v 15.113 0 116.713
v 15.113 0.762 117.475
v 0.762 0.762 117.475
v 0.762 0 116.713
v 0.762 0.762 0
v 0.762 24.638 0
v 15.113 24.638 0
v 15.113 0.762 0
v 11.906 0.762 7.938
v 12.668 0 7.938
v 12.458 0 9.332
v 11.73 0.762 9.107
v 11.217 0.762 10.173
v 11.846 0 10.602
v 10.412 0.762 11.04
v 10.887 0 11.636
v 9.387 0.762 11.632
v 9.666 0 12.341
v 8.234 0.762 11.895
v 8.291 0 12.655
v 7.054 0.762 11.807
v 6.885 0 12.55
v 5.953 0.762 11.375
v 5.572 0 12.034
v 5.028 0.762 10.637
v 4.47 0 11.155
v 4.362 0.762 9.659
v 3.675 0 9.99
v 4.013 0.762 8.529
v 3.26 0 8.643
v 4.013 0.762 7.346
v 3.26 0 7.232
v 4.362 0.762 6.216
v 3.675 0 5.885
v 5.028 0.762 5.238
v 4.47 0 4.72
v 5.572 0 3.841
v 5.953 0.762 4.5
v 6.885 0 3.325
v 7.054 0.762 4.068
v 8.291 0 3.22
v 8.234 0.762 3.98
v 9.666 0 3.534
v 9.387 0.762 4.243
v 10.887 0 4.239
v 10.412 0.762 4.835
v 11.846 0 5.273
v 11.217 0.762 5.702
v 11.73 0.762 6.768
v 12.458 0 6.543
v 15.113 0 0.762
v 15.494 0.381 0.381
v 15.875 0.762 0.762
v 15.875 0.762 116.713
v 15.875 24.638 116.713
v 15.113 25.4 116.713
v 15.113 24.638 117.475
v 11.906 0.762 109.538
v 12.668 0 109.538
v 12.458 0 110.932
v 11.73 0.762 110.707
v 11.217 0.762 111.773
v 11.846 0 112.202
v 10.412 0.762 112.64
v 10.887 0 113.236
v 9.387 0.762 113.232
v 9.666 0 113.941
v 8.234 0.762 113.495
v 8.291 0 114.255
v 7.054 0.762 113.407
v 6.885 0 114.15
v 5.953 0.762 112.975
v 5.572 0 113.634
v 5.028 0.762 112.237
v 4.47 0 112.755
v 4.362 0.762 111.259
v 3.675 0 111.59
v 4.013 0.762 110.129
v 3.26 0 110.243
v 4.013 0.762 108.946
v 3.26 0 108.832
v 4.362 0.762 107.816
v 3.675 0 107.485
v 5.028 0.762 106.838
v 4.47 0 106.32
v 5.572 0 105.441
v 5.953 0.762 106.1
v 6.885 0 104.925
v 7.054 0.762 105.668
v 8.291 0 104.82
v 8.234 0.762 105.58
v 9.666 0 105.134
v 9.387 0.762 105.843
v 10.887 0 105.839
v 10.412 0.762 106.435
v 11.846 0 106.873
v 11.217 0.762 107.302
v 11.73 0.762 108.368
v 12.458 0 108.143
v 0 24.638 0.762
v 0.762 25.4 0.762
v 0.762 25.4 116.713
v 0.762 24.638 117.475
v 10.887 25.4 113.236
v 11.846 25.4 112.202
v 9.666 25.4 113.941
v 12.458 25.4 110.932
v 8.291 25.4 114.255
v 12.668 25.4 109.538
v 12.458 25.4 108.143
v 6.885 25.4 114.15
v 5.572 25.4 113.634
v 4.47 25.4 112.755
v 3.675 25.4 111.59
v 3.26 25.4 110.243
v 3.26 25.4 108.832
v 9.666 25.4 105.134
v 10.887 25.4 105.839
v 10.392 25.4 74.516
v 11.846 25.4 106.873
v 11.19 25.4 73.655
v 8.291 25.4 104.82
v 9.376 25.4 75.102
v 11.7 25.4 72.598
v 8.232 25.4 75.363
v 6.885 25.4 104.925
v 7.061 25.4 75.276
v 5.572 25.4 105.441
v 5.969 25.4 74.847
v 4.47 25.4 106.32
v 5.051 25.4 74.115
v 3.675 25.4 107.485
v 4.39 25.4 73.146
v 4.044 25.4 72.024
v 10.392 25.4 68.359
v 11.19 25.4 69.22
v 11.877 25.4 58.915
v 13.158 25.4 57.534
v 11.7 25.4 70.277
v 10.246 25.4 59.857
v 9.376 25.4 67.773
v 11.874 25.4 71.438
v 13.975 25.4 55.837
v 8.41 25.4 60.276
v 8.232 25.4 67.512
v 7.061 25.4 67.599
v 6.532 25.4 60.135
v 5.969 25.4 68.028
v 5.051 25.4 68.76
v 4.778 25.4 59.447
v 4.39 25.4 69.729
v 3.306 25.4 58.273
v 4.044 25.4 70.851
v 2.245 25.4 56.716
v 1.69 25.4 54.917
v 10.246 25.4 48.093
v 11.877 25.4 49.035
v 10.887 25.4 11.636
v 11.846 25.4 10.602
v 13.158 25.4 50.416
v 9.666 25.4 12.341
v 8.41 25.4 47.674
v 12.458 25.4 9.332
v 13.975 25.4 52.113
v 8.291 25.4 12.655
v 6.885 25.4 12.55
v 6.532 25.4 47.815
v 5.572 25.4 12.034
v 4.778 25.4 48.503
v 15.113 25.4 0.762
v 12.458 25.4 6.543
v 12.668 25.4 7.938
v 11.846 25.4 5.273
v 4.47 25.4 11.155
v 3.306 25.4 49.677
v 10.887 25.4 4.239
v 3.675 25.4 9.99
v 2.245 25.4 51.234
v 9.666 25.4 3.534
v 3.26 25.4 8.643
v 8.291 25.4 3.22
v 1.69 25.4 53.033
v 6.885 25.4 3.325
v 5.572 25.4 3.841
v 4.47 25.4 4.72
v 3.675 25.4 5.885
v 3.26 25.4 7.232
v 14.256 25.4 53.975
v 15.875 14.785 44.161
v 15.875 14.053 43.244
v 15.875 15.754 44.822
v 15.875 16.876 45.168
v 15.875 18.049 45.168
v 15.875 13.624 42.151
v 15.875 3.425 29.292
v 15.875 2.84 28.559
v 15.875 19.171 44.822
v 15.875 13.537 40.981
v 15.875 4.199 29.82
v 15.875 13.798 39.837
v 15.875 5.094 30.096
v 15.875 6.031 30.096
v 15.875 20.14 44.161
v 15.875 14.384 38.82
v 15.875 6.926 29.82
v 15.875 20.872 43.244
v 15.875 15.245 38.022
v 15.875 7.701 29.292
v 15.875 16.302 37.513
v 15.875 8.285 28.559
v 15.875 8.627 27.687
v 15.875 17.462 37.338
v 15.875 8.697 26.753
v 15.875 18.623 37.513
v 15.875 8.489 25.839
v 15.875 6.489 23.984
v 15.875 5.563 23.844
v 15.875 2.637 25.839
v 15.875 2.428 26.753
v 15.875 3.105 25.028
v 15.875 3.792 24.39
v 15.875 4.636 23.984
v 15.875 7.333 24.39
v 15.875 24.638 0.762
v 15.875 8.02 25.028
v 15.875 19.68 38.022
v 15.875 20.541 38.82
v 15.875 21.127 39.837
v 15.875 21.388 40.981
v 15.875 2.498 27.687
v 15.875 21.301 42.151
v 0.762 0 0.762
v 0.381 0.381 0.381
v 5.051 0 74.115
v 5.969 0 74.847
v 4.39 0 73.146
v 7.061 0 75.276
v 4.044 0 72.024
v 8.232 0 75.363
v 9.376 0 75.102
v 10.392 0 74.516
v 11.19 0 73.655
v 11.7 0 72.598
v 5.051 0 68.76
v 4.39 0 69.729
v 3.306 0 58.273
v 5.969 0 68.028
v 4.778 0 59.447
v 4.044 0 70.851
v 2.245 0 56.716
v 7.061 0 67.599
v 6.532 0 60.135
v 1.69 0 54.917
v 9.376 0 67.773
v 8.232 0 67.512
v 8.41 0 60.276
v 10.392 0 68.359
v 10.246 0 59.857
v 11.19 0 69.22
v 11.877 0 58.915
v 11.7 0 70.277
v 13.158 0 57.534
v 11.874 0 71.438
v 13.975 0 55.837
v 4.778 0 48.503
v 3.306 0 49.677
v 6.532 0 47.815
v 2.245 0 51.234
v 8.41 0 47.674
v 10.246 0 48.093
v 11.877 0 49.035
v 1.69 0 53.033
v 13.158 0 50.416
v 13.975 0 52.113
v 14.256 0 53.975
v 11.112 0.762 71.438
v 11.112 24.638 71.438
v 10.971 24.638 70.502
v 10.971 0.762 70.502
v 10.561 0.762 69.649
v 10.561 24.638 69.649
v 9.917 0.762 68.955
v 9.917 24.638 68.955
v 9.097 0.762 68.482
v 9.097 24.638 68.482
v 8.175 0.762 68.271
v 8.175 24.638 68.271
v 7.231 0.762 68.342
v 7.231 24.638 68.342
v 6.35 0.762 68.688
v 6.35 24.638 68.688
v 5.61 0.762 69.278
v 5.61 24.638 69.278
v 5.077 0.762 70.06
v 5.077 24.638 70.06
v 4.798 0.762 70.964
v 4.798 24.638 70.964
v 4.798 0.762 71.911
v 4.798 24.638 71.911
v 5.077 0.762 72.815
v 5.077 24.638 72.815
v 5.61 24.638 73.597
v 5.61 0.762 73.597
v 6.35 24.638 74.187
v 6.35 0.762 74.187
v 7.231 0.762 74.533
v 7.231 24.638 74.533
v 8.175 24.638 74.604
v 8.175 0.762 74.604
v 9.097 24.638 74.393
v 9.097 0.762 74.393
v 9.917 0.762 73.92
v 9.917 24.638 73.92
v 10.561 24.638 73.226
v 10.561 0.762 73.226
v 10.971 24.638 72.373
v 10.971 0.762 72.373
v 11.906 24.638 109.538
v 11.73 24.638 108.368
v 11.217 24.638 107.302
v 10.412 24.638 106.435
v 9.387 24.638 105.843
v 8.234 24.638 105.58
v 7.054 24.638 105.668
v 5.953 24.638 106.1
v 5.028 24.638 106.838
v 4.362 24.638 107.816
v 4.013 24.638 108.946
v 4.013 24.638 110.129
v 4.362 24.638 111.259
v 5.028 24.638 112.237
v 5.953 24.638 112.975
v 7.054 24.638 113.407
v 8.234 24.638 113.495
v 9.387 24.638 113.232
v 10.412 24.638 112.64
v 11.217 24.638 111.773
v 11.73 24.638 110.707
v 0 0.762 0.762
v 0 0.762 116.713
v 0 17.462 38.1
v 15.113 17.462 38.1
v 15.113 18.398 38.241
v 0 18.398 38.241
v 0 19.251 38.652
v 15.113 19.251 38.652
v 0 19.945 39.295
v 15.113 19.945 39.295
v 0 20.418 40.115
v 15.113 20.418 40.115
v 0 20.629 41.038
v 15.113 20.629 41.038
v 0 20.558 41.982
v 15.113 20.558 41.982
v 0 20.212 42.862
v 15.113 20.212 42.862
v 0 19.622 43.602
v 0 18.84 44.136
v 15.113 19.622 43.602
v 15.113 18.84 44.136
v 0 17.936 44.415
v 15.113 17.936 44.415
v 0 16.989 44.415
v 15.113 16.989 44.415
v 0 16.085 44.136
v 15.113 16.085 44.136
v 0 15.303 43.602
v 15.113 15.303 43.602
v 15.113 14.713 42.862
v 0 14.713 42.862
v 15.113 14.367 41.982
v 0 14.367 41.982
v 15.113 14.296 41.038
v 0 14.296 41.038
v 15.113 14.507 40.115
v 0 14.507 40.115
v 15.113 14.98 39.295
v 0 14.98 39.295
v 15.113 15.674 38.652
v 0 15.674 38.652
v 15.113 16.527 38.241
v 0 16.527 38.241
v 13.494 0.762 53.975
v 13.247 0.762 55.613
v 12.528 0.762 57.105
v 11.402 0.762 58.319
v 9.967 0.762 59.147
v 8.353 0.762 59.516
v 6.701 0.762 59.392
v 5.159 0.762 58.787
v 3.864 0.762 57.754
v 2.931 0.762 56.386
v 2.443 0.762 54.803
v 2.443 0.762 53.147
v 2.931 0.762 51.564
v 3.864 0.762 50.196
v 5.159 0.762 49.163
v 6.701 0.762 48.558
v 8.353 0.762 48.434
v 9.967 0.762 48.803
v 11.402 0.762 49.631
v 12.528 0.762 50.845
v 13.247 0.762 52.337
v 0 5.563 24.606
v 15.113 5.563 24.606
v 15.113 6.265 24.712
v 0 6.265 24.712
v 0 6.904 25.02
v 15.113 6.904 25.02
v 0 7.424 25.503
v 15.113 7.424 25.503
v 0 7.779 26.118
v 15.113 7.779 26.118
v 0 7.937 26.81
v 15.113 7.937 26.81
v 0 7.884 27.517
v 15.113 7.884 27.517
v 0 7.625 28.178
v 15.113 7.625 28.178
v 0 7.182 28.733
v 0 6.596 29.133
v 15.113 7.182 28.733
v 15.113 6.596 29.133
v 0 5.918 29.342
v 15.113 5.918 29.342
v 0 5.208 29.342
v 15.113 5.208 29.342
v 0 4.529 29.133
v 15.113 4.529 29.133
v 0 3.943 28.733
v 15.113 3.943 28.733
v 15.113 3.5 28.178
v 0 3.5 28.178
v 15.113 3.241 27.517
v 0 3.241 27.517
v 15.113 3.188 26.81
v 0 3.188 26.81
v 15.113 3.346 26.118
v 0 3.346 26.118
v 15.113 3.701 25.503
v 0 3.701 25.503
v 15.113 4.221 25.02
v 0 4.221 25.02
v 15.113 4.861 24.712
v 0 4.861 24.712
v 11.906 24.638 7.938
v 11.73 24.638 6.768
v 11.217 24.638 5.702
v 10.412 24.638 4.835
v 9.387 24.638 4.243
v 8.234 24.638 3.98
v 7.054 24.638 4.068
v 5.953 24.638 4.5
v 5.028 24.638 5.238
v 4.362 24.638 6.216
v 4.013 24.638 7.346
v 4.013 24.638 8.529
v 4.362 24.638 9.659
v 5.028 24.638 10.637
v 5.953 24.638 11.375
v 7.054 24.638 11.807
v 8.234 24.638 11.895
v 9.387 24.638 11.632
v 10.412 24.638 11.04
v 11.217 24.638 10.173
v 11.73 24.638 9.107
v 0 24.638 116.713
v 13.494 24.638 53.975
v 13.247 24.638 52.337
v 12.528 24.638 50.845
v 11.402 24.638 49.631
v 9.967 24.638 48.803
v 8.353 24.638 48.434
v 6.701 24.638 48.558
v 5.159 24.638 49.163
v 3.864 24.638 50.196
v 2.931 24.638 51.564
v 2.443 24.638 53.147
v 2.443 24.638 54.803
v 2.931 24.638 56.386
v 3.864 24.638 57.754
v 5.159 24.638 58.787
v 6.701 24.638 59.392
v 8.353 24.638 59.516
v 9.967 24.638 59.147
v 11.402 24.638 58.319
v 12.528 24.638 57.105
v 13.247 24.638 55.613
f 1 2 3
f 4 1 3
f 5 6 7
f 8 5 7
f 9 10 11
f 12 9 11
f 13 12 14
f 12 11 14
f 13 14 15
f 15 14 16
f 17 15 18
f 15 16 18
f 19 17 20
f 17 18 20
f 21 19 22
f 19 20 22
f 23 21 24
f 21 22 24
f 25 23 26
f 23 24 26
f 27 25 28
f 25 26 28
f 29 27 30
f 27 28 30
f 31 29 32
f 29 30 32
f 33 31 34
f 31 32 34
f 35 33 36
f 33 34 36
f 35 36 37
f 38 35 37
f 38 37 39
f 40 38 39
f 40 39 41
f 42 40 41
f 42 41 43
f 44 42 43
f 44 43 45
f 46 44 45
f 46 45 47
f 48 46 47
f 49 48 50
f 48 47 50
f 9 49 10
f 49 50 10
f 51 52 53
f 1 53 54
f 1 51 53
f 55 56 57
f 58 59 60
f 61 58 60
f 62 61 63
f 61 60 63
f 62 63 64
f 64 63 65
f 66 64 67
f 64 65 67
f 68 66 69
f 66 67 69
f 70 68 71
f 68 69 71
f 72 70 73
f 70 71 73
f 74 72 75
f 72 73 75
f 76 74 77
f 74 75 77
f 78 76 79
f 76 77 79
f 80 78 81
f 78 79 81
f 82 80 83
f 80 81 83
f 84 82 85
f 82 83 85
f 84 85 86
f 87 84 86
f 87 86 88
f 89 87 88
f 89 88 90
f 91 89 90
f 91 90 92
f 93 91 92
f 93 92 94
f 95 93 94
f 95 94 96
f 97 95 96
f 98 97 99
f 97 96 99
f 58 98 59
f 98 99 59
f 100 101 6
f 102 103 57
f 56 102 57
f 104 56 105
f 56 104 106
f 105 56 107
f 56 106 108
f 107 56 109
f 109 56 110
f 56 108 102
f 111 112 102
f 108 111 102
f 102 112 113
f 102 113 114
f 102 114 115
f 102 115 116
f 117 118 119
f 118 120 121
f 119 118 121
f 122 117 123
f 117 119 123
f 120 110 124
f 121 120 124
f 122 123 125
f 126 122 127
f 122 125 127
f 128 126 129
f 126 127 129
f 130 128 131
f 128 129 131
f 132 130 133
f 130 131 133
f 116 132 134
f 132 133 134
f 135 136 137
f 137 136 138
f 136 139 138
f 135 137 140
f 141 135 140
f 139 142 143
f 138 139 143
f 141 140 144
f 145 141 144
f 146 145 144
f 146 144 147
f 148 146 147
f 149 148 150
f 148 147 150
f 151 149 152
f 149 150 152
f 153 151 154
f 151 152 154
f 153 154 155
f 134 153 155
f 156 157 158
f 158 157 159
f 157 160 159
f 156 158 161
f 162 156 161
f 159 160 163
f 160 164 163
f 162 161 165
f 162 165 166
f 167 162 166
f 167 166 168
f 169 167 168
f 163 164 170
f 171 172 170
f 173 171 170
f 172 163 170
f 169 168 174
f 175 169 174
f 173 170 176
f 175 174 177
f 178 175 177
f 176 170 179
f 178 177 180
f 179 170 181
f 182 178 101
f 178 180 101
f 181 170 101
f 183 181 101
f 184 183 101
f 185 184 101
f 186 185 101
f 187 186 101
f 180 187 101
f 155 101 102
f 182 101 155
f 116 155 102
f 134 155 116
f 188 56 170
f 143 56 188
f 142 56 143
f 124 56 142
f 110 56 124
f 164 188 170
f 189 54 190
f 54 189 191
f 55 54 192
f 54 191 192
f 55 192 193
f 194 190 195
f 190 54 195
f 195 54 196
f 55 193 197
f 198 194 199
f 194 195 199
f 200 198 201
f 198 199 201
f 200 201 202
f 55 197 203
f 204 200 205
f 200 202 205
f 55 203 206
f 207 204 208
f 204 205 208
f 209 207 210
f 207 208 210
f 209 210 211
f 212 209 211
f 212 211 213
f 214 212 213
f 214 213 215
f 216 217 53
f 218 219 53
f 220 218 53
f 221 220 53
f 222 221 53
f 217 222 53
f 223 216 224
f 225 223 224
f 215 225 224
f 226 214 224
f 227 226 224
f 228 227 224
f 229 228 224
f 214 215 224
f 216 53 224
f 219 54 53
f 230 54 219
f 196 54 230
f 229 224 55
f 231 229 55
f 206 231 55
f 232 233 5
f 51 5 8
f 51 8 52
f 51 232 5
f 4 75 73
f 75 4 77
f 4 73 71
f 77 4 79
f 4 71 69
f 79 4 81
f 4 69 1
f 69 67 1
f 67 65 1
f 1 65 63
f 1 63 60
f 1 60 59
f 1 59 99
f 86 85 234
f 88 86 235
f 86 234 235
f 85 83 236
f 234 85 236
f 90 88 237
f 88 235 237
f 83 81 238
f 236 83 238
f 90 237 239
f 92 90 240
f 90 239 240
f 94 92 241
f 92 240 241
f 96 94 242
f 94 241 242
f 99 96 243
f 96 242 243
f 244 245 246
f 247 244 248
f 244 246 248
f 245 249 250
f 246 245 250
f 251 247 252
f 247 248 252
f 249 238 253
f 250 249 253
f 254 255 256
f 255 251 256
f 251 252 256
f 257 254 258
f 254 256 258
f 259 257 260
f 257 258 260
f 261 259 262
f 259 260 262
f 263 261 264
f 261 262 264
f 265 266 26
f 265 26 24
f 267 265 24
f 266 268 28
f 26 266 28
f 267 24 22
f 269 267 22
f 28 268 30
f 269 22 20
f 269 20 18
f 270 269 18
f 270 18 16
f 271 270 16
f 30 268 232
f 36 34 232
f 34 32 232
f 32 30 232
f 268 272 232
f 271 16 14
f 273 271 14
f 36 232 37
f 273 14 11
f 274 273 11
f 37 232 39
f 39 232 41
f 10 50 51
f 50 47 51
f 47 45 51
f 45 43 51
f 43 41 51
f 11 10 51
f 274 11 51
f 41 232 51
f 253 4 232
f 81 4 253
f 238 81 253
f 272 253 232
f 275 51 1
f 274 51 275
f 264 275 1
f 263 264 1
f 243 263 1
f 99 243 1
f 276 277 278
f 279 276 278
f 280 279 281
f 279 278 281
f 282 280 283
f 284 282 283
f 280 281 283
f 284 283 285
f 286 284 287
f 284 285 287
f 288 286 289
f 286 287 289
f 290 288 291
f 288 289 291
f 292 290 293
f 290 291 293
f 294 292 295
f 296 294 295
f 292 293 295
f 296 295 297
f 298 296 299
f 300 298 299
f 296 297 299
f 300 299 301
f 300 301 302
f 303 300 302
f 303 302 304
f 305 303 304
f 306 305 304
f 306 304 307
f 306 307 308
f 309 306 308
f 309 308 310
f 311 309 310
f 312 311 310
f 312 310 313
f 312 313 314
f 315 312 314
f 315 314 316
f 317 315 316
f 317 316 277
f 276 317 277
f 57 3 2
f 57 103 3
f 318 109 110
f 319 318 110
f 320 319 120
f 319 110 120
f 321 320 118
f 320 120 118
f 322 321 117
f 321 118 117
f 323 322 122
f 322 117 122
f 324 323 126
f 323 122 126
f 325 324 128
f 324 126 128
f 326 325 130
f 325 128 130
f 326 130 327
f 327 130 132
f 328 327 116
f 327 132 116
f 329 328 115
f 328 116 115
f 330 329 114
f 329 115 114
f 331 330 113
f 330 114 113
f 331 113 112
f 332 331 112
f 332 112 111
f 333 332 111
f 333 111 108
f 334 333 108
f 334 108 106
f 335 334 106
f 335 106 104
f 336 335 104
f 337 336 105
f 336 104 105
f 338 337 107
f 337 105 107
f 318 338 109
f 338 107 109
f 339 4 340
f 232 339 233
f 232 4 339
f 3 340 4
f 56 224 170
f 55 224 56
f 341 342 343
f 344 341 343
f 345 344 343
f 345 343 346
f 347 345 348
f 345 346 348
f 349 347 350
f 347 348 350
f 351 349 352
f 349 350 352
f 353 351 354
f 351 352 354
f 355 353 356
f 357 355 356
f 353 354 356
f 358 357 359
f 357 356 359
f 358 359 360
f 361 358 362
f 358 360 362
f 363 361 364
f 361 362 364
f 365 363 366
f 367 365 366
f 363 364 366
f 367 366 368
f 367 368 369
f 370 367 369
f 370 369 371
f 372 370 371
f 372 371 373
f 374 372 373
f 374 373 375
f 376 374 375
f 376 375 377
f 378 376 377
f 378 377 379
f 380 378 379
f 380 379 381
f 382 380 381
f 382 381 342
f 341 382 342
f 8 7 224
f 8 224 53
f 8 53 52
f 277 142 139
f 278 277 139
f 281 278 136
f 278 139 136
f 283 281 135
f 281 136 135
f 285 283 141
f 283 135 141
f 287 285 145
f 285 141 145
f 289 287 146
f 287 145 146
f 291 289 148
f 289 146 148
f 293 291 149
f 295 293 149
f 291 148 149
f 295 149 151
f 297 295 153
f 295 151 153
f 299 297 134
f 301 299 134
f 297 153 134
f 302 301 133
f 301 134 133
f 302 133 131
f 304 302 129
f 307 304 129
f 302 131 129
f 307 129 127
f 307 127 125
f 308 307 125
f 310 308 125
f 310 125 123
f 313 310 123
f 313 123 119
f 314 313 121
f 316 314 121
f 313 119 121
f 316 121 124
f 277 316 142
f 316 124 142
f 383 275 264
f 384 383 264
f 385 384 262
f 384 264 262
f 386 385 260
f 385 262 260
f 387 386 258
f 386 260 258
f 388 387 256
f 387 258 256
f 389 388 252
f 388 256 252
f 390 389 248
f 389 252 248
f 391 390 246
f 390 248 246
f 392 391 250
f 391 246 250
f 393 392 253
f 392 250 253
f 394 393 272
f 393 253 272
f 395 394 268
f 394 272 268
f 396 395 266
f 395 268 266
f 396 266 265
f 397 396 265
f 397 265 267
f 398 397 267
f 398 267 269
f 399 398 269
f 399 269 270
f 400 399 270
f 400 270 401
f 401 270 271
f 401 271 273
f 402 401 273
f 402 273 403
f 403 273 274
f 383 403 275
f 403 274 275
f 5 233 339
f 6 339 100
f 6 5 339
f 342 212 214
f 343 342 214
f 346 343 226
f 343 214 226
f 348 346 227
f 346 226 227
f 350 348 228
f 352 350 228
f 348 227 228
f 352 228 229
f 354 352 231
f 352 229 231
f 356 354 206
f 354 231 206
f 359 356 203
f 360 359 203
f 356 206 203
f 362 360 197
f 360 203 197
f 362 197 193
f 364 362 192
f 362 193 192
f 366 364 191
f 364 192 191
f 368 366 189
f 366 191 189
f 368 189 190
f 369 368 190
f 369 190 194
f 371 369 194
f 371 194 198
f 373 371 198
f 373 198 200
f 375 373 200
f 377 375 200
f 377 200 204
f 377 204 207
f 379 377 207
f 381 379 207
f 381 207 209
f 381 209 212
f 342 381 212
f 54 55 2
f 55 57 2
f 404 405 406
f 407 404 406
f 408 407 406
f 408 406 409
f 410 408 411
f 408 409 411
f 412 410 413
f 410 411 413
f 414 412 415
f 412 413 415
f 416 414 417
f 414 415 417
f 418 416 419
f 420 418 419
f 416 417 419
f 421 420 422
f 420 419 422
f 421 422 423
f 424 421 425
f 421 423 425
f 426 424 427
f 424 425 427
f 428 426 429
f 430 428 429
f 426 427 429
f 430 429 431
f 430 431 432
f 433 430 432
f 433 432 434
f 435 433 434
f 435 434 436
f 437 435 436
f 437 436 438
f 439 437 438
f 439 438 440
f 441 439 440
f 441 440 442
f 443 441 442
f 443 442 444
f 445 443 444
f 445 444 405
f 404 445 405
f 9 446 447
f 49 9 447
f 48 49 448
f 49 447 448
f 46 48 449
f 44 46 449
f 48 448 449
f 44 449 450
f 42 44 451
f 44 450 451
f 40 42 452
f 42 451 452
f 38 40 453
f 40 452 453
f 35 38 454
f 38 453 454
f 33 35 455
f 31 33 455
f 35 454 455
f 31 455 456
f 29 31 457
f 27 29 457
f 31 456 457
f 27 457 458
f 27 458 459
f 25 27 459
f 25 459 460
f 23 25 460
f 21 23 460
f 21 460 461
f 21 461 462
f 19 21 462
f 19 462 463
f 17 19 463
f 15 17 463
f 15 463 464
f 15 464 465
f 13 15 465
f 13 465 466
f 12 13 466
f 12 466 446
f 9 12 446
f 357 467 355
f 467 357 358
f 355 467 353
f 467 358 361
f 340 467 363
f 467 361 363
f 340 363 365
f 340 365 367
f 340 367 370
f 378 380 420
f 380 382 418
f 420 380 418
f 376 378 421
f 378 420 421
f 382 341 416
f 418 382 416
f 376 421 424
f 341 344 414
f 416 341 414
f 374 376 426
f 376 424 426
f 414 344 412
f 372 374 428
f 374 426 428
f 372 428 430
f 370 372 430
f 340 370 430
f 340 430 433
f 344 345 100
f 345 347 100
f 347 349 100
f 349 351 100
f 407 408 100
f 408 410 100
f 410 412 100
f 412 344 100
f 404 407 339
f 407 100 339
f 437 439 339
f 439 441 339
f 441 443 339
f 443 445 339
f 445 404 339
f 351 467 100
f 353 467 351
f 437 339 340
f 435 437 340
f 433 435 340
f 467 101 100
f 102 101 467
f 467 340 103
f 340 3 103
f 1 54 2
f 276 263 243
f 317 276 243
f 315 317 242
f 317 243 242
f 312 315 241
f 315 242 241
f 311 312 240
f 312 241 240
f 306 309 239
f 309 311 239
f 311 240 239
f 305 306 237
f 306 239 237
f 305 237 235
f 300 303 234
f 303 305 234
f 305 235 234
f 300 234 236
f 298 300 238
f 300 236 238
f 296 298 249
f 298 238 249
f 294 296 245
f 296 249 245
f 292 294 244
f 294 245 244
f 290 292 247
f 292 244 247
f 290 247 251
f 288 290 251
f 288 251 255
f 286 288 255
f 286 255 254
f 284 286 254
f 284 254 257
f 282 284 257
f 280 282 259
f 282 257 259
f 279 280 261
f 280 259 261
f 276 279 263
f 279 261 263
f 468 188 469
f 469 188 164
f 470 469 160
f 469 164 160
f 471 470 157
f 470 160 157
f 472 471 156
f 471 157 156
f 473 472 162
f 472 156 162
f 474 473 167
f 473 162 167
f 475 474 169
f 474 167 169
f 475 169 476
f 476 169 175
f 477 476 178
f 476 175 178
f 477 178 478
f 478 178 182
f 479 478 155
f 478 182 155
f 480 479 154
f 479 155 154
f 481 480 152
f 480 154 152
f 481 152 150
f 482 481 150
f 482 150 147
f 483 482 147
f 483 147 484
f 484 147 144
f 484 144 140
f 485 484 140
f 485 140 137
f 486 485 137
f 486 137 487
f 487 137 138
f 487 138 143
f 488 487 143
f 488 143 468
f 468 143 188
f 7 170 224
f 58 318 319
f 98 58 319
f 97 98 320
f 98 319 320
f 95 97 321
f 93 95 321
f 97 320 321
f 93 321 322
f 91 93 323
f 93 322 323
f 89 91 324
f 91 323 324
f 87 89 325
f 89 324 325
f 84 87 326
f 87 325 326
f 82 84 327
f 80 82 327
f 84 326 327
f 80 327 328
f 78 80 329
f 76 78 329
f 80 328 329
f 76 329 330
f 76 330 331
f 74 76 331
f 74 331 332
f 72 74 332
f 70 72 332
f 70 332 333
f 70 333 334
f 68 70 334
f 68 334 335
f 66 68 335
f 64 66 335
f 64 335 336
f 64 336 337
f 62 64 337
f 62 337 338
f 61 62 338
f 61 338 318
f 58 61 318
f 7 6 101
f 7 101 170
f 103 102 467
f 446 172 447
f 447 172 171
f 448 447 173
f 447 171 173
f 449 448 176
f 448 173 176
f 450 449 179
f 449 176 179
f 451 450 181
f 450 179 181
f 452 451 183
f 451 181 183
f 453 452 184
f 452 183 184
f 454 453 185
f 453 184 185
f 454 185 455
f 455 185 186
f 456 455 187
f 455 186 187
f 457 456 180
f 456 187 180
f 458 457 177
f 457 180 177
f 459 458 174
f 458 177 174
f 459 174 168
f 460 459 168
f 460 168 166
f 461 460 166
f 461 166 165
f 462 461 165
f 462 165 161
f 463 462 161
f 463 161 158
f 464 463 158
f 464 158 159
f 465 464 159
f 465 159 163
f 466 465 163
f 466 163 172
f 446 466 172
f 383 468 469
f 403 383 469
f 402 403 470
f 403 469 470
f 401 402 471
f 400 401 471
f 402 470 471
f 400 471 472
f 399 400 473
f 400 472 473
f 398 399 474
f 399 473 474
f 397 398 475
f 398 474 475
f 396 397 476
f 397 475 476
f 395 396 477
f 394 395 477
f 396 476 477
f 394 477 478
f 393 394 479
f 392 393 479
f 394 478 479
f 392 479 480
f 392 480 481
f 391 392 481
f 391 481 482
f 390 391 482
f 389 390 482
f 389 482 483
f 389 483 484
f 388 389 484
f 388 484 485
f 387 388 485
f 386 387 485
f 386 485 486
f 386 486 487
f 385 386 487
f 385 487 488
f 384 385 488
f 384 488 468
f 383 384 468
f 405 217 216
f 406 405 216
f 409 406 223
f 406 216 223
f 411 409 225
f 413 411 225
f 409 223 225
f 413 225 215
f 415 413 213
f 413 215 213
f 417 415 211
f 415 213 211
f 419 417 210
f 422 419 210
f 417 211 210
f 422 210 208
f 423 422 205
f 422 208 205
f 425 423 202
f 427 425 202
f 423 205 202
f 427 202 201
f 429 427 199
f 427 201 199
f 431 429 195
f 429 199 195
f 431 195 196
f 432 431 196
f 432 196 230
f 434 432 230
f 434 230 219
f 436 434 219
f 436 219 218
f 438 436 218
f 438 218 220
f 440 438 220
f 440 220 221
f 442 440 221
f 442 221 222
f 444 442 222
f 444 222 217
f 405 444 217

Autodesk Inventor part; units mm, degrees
ref_plane "YZ Plane" through (0, 0, 0) normal (1, 0, 0) x (0, 1, 0)
ref_plane "XZ Plane" through (0, 0, 0) normal (0, 1, 0) x (-1, 0, 0)
ref_plane "XY Plane" through (0, 0, 0) normal (0, 0, 1) x (1, 0, 0)
sketch "Sketch1" plane through (0, 0, 0) normal (0, 0, 1) x (1, 0, 0)
  line L0 (0, 0) -> (15.875, 0)
  line L1 (15.875, 0) -> (15.875, 25.4)
  line L2 (15.875, 25.4) -> (0, 25.4)
  line L3 (0, 25.4) -> (0, 0)
  dimension "d0" = 15.875
  dimension "d1" = 25.4
extrude "Extrusion1" add sketch "Sketch1" along normal blind 117.475
chamfer "Chamfer1" distance 0.762 angle 45 11 edges at (15.875, 25.4, 58.7375) (7.9375, 25.4, 117.475) (0, 25.4, 58.7375) (7.9375, 25.4, 0) (15.875, 12.7, 0) (15.875, 0, 58.7375) (0, 12.7, 0) (0, 0, 58.7375) (15.875, 12.7, 117.475) (0, 12.7, 117.475) (7.9375, 0, 117.475)
sketch "Sketch2" plane through (0.762, 25.4, 0.762) normal (0, 1, 0) x (1, 0, 0)
  line L0 (14.351, 0.762) -> (0, 0.762) projected
  line L1 (0, -116.713) -> (14.351, -116.713) projected
  line L2 (-0.762, 0) -> (-0.762, -115.951) projected
  line L3 (15.113, -115.951) -> (15.113, 0) projected
  circle A0 centre (7.1755, -108.7755) radius 3.9688
  circle A1 centre (7.1755, -70.6755) radius 3.175
  circle A2 centre (7.1755, -53.213) radius 5.5563
  circle A3 centre (7.1755, -7.1755) radius 3.9688
  point P0 (-0.762, 0.762)
  dimension "d7" = 7.9375
  dimension "d8" = 7.9375
  dimension "d9" = 71.4375
  dimension "d10" = 53.975
  dimension "d11" = 7.9375
  dimension "d12" = 7.9375
  dimension "d13" = 6.35
  dimension "d14" = 11.1125
  dimension "d15" = 7.9375
extrude "Extrusion2" cut sketch "Sketch2" against normal blind 117.475
sketch "Sketch3" plane through (15.875, 0.762, 0.762) normal (1, 0, 0) x (0, 0, -1)
  line L0 (0.762, -0.762) -> (0.762, 23.876) projected
  line L1 (-115.951, -0.762) -> (0.762, -0.762) projected
  circle A0 centre (-40.513, 16.7005) radius 3.175
  circle A1 centre (-26.2255, 4.8006) radius 2.3813
  dimension "d18" = 26.9875
  dimension "d19" = 5.5626
  dimension "d20" = 17.4625
  dimension "d21" = 41.275
  dimension "d22" = 6.35
  dimension "d23" = 4.7625
extrude "Extrusion3" cut sketch "Sketch3" against normal blind 117.475
chamfer "Chamfer2" distance 0.762 angle 45 11 edges at (2.3812, 25.4, 53.975) (4.7625, 25.4, 71.4375) (3.9687, 25.4, 109.5375) (3.9687, 25.4, 7.9375) (15.875, 17.4625, 44.45) (15.875, 5.5626, 29.3688) (7.9375, 0, 0) (3.9687, 0, 7.9375) (2.3812, 0, 53.975) (4.7625, 0, 71.4375) (3.9687, 0, 109.5375)
properties part number "Upper Die Center Support"
